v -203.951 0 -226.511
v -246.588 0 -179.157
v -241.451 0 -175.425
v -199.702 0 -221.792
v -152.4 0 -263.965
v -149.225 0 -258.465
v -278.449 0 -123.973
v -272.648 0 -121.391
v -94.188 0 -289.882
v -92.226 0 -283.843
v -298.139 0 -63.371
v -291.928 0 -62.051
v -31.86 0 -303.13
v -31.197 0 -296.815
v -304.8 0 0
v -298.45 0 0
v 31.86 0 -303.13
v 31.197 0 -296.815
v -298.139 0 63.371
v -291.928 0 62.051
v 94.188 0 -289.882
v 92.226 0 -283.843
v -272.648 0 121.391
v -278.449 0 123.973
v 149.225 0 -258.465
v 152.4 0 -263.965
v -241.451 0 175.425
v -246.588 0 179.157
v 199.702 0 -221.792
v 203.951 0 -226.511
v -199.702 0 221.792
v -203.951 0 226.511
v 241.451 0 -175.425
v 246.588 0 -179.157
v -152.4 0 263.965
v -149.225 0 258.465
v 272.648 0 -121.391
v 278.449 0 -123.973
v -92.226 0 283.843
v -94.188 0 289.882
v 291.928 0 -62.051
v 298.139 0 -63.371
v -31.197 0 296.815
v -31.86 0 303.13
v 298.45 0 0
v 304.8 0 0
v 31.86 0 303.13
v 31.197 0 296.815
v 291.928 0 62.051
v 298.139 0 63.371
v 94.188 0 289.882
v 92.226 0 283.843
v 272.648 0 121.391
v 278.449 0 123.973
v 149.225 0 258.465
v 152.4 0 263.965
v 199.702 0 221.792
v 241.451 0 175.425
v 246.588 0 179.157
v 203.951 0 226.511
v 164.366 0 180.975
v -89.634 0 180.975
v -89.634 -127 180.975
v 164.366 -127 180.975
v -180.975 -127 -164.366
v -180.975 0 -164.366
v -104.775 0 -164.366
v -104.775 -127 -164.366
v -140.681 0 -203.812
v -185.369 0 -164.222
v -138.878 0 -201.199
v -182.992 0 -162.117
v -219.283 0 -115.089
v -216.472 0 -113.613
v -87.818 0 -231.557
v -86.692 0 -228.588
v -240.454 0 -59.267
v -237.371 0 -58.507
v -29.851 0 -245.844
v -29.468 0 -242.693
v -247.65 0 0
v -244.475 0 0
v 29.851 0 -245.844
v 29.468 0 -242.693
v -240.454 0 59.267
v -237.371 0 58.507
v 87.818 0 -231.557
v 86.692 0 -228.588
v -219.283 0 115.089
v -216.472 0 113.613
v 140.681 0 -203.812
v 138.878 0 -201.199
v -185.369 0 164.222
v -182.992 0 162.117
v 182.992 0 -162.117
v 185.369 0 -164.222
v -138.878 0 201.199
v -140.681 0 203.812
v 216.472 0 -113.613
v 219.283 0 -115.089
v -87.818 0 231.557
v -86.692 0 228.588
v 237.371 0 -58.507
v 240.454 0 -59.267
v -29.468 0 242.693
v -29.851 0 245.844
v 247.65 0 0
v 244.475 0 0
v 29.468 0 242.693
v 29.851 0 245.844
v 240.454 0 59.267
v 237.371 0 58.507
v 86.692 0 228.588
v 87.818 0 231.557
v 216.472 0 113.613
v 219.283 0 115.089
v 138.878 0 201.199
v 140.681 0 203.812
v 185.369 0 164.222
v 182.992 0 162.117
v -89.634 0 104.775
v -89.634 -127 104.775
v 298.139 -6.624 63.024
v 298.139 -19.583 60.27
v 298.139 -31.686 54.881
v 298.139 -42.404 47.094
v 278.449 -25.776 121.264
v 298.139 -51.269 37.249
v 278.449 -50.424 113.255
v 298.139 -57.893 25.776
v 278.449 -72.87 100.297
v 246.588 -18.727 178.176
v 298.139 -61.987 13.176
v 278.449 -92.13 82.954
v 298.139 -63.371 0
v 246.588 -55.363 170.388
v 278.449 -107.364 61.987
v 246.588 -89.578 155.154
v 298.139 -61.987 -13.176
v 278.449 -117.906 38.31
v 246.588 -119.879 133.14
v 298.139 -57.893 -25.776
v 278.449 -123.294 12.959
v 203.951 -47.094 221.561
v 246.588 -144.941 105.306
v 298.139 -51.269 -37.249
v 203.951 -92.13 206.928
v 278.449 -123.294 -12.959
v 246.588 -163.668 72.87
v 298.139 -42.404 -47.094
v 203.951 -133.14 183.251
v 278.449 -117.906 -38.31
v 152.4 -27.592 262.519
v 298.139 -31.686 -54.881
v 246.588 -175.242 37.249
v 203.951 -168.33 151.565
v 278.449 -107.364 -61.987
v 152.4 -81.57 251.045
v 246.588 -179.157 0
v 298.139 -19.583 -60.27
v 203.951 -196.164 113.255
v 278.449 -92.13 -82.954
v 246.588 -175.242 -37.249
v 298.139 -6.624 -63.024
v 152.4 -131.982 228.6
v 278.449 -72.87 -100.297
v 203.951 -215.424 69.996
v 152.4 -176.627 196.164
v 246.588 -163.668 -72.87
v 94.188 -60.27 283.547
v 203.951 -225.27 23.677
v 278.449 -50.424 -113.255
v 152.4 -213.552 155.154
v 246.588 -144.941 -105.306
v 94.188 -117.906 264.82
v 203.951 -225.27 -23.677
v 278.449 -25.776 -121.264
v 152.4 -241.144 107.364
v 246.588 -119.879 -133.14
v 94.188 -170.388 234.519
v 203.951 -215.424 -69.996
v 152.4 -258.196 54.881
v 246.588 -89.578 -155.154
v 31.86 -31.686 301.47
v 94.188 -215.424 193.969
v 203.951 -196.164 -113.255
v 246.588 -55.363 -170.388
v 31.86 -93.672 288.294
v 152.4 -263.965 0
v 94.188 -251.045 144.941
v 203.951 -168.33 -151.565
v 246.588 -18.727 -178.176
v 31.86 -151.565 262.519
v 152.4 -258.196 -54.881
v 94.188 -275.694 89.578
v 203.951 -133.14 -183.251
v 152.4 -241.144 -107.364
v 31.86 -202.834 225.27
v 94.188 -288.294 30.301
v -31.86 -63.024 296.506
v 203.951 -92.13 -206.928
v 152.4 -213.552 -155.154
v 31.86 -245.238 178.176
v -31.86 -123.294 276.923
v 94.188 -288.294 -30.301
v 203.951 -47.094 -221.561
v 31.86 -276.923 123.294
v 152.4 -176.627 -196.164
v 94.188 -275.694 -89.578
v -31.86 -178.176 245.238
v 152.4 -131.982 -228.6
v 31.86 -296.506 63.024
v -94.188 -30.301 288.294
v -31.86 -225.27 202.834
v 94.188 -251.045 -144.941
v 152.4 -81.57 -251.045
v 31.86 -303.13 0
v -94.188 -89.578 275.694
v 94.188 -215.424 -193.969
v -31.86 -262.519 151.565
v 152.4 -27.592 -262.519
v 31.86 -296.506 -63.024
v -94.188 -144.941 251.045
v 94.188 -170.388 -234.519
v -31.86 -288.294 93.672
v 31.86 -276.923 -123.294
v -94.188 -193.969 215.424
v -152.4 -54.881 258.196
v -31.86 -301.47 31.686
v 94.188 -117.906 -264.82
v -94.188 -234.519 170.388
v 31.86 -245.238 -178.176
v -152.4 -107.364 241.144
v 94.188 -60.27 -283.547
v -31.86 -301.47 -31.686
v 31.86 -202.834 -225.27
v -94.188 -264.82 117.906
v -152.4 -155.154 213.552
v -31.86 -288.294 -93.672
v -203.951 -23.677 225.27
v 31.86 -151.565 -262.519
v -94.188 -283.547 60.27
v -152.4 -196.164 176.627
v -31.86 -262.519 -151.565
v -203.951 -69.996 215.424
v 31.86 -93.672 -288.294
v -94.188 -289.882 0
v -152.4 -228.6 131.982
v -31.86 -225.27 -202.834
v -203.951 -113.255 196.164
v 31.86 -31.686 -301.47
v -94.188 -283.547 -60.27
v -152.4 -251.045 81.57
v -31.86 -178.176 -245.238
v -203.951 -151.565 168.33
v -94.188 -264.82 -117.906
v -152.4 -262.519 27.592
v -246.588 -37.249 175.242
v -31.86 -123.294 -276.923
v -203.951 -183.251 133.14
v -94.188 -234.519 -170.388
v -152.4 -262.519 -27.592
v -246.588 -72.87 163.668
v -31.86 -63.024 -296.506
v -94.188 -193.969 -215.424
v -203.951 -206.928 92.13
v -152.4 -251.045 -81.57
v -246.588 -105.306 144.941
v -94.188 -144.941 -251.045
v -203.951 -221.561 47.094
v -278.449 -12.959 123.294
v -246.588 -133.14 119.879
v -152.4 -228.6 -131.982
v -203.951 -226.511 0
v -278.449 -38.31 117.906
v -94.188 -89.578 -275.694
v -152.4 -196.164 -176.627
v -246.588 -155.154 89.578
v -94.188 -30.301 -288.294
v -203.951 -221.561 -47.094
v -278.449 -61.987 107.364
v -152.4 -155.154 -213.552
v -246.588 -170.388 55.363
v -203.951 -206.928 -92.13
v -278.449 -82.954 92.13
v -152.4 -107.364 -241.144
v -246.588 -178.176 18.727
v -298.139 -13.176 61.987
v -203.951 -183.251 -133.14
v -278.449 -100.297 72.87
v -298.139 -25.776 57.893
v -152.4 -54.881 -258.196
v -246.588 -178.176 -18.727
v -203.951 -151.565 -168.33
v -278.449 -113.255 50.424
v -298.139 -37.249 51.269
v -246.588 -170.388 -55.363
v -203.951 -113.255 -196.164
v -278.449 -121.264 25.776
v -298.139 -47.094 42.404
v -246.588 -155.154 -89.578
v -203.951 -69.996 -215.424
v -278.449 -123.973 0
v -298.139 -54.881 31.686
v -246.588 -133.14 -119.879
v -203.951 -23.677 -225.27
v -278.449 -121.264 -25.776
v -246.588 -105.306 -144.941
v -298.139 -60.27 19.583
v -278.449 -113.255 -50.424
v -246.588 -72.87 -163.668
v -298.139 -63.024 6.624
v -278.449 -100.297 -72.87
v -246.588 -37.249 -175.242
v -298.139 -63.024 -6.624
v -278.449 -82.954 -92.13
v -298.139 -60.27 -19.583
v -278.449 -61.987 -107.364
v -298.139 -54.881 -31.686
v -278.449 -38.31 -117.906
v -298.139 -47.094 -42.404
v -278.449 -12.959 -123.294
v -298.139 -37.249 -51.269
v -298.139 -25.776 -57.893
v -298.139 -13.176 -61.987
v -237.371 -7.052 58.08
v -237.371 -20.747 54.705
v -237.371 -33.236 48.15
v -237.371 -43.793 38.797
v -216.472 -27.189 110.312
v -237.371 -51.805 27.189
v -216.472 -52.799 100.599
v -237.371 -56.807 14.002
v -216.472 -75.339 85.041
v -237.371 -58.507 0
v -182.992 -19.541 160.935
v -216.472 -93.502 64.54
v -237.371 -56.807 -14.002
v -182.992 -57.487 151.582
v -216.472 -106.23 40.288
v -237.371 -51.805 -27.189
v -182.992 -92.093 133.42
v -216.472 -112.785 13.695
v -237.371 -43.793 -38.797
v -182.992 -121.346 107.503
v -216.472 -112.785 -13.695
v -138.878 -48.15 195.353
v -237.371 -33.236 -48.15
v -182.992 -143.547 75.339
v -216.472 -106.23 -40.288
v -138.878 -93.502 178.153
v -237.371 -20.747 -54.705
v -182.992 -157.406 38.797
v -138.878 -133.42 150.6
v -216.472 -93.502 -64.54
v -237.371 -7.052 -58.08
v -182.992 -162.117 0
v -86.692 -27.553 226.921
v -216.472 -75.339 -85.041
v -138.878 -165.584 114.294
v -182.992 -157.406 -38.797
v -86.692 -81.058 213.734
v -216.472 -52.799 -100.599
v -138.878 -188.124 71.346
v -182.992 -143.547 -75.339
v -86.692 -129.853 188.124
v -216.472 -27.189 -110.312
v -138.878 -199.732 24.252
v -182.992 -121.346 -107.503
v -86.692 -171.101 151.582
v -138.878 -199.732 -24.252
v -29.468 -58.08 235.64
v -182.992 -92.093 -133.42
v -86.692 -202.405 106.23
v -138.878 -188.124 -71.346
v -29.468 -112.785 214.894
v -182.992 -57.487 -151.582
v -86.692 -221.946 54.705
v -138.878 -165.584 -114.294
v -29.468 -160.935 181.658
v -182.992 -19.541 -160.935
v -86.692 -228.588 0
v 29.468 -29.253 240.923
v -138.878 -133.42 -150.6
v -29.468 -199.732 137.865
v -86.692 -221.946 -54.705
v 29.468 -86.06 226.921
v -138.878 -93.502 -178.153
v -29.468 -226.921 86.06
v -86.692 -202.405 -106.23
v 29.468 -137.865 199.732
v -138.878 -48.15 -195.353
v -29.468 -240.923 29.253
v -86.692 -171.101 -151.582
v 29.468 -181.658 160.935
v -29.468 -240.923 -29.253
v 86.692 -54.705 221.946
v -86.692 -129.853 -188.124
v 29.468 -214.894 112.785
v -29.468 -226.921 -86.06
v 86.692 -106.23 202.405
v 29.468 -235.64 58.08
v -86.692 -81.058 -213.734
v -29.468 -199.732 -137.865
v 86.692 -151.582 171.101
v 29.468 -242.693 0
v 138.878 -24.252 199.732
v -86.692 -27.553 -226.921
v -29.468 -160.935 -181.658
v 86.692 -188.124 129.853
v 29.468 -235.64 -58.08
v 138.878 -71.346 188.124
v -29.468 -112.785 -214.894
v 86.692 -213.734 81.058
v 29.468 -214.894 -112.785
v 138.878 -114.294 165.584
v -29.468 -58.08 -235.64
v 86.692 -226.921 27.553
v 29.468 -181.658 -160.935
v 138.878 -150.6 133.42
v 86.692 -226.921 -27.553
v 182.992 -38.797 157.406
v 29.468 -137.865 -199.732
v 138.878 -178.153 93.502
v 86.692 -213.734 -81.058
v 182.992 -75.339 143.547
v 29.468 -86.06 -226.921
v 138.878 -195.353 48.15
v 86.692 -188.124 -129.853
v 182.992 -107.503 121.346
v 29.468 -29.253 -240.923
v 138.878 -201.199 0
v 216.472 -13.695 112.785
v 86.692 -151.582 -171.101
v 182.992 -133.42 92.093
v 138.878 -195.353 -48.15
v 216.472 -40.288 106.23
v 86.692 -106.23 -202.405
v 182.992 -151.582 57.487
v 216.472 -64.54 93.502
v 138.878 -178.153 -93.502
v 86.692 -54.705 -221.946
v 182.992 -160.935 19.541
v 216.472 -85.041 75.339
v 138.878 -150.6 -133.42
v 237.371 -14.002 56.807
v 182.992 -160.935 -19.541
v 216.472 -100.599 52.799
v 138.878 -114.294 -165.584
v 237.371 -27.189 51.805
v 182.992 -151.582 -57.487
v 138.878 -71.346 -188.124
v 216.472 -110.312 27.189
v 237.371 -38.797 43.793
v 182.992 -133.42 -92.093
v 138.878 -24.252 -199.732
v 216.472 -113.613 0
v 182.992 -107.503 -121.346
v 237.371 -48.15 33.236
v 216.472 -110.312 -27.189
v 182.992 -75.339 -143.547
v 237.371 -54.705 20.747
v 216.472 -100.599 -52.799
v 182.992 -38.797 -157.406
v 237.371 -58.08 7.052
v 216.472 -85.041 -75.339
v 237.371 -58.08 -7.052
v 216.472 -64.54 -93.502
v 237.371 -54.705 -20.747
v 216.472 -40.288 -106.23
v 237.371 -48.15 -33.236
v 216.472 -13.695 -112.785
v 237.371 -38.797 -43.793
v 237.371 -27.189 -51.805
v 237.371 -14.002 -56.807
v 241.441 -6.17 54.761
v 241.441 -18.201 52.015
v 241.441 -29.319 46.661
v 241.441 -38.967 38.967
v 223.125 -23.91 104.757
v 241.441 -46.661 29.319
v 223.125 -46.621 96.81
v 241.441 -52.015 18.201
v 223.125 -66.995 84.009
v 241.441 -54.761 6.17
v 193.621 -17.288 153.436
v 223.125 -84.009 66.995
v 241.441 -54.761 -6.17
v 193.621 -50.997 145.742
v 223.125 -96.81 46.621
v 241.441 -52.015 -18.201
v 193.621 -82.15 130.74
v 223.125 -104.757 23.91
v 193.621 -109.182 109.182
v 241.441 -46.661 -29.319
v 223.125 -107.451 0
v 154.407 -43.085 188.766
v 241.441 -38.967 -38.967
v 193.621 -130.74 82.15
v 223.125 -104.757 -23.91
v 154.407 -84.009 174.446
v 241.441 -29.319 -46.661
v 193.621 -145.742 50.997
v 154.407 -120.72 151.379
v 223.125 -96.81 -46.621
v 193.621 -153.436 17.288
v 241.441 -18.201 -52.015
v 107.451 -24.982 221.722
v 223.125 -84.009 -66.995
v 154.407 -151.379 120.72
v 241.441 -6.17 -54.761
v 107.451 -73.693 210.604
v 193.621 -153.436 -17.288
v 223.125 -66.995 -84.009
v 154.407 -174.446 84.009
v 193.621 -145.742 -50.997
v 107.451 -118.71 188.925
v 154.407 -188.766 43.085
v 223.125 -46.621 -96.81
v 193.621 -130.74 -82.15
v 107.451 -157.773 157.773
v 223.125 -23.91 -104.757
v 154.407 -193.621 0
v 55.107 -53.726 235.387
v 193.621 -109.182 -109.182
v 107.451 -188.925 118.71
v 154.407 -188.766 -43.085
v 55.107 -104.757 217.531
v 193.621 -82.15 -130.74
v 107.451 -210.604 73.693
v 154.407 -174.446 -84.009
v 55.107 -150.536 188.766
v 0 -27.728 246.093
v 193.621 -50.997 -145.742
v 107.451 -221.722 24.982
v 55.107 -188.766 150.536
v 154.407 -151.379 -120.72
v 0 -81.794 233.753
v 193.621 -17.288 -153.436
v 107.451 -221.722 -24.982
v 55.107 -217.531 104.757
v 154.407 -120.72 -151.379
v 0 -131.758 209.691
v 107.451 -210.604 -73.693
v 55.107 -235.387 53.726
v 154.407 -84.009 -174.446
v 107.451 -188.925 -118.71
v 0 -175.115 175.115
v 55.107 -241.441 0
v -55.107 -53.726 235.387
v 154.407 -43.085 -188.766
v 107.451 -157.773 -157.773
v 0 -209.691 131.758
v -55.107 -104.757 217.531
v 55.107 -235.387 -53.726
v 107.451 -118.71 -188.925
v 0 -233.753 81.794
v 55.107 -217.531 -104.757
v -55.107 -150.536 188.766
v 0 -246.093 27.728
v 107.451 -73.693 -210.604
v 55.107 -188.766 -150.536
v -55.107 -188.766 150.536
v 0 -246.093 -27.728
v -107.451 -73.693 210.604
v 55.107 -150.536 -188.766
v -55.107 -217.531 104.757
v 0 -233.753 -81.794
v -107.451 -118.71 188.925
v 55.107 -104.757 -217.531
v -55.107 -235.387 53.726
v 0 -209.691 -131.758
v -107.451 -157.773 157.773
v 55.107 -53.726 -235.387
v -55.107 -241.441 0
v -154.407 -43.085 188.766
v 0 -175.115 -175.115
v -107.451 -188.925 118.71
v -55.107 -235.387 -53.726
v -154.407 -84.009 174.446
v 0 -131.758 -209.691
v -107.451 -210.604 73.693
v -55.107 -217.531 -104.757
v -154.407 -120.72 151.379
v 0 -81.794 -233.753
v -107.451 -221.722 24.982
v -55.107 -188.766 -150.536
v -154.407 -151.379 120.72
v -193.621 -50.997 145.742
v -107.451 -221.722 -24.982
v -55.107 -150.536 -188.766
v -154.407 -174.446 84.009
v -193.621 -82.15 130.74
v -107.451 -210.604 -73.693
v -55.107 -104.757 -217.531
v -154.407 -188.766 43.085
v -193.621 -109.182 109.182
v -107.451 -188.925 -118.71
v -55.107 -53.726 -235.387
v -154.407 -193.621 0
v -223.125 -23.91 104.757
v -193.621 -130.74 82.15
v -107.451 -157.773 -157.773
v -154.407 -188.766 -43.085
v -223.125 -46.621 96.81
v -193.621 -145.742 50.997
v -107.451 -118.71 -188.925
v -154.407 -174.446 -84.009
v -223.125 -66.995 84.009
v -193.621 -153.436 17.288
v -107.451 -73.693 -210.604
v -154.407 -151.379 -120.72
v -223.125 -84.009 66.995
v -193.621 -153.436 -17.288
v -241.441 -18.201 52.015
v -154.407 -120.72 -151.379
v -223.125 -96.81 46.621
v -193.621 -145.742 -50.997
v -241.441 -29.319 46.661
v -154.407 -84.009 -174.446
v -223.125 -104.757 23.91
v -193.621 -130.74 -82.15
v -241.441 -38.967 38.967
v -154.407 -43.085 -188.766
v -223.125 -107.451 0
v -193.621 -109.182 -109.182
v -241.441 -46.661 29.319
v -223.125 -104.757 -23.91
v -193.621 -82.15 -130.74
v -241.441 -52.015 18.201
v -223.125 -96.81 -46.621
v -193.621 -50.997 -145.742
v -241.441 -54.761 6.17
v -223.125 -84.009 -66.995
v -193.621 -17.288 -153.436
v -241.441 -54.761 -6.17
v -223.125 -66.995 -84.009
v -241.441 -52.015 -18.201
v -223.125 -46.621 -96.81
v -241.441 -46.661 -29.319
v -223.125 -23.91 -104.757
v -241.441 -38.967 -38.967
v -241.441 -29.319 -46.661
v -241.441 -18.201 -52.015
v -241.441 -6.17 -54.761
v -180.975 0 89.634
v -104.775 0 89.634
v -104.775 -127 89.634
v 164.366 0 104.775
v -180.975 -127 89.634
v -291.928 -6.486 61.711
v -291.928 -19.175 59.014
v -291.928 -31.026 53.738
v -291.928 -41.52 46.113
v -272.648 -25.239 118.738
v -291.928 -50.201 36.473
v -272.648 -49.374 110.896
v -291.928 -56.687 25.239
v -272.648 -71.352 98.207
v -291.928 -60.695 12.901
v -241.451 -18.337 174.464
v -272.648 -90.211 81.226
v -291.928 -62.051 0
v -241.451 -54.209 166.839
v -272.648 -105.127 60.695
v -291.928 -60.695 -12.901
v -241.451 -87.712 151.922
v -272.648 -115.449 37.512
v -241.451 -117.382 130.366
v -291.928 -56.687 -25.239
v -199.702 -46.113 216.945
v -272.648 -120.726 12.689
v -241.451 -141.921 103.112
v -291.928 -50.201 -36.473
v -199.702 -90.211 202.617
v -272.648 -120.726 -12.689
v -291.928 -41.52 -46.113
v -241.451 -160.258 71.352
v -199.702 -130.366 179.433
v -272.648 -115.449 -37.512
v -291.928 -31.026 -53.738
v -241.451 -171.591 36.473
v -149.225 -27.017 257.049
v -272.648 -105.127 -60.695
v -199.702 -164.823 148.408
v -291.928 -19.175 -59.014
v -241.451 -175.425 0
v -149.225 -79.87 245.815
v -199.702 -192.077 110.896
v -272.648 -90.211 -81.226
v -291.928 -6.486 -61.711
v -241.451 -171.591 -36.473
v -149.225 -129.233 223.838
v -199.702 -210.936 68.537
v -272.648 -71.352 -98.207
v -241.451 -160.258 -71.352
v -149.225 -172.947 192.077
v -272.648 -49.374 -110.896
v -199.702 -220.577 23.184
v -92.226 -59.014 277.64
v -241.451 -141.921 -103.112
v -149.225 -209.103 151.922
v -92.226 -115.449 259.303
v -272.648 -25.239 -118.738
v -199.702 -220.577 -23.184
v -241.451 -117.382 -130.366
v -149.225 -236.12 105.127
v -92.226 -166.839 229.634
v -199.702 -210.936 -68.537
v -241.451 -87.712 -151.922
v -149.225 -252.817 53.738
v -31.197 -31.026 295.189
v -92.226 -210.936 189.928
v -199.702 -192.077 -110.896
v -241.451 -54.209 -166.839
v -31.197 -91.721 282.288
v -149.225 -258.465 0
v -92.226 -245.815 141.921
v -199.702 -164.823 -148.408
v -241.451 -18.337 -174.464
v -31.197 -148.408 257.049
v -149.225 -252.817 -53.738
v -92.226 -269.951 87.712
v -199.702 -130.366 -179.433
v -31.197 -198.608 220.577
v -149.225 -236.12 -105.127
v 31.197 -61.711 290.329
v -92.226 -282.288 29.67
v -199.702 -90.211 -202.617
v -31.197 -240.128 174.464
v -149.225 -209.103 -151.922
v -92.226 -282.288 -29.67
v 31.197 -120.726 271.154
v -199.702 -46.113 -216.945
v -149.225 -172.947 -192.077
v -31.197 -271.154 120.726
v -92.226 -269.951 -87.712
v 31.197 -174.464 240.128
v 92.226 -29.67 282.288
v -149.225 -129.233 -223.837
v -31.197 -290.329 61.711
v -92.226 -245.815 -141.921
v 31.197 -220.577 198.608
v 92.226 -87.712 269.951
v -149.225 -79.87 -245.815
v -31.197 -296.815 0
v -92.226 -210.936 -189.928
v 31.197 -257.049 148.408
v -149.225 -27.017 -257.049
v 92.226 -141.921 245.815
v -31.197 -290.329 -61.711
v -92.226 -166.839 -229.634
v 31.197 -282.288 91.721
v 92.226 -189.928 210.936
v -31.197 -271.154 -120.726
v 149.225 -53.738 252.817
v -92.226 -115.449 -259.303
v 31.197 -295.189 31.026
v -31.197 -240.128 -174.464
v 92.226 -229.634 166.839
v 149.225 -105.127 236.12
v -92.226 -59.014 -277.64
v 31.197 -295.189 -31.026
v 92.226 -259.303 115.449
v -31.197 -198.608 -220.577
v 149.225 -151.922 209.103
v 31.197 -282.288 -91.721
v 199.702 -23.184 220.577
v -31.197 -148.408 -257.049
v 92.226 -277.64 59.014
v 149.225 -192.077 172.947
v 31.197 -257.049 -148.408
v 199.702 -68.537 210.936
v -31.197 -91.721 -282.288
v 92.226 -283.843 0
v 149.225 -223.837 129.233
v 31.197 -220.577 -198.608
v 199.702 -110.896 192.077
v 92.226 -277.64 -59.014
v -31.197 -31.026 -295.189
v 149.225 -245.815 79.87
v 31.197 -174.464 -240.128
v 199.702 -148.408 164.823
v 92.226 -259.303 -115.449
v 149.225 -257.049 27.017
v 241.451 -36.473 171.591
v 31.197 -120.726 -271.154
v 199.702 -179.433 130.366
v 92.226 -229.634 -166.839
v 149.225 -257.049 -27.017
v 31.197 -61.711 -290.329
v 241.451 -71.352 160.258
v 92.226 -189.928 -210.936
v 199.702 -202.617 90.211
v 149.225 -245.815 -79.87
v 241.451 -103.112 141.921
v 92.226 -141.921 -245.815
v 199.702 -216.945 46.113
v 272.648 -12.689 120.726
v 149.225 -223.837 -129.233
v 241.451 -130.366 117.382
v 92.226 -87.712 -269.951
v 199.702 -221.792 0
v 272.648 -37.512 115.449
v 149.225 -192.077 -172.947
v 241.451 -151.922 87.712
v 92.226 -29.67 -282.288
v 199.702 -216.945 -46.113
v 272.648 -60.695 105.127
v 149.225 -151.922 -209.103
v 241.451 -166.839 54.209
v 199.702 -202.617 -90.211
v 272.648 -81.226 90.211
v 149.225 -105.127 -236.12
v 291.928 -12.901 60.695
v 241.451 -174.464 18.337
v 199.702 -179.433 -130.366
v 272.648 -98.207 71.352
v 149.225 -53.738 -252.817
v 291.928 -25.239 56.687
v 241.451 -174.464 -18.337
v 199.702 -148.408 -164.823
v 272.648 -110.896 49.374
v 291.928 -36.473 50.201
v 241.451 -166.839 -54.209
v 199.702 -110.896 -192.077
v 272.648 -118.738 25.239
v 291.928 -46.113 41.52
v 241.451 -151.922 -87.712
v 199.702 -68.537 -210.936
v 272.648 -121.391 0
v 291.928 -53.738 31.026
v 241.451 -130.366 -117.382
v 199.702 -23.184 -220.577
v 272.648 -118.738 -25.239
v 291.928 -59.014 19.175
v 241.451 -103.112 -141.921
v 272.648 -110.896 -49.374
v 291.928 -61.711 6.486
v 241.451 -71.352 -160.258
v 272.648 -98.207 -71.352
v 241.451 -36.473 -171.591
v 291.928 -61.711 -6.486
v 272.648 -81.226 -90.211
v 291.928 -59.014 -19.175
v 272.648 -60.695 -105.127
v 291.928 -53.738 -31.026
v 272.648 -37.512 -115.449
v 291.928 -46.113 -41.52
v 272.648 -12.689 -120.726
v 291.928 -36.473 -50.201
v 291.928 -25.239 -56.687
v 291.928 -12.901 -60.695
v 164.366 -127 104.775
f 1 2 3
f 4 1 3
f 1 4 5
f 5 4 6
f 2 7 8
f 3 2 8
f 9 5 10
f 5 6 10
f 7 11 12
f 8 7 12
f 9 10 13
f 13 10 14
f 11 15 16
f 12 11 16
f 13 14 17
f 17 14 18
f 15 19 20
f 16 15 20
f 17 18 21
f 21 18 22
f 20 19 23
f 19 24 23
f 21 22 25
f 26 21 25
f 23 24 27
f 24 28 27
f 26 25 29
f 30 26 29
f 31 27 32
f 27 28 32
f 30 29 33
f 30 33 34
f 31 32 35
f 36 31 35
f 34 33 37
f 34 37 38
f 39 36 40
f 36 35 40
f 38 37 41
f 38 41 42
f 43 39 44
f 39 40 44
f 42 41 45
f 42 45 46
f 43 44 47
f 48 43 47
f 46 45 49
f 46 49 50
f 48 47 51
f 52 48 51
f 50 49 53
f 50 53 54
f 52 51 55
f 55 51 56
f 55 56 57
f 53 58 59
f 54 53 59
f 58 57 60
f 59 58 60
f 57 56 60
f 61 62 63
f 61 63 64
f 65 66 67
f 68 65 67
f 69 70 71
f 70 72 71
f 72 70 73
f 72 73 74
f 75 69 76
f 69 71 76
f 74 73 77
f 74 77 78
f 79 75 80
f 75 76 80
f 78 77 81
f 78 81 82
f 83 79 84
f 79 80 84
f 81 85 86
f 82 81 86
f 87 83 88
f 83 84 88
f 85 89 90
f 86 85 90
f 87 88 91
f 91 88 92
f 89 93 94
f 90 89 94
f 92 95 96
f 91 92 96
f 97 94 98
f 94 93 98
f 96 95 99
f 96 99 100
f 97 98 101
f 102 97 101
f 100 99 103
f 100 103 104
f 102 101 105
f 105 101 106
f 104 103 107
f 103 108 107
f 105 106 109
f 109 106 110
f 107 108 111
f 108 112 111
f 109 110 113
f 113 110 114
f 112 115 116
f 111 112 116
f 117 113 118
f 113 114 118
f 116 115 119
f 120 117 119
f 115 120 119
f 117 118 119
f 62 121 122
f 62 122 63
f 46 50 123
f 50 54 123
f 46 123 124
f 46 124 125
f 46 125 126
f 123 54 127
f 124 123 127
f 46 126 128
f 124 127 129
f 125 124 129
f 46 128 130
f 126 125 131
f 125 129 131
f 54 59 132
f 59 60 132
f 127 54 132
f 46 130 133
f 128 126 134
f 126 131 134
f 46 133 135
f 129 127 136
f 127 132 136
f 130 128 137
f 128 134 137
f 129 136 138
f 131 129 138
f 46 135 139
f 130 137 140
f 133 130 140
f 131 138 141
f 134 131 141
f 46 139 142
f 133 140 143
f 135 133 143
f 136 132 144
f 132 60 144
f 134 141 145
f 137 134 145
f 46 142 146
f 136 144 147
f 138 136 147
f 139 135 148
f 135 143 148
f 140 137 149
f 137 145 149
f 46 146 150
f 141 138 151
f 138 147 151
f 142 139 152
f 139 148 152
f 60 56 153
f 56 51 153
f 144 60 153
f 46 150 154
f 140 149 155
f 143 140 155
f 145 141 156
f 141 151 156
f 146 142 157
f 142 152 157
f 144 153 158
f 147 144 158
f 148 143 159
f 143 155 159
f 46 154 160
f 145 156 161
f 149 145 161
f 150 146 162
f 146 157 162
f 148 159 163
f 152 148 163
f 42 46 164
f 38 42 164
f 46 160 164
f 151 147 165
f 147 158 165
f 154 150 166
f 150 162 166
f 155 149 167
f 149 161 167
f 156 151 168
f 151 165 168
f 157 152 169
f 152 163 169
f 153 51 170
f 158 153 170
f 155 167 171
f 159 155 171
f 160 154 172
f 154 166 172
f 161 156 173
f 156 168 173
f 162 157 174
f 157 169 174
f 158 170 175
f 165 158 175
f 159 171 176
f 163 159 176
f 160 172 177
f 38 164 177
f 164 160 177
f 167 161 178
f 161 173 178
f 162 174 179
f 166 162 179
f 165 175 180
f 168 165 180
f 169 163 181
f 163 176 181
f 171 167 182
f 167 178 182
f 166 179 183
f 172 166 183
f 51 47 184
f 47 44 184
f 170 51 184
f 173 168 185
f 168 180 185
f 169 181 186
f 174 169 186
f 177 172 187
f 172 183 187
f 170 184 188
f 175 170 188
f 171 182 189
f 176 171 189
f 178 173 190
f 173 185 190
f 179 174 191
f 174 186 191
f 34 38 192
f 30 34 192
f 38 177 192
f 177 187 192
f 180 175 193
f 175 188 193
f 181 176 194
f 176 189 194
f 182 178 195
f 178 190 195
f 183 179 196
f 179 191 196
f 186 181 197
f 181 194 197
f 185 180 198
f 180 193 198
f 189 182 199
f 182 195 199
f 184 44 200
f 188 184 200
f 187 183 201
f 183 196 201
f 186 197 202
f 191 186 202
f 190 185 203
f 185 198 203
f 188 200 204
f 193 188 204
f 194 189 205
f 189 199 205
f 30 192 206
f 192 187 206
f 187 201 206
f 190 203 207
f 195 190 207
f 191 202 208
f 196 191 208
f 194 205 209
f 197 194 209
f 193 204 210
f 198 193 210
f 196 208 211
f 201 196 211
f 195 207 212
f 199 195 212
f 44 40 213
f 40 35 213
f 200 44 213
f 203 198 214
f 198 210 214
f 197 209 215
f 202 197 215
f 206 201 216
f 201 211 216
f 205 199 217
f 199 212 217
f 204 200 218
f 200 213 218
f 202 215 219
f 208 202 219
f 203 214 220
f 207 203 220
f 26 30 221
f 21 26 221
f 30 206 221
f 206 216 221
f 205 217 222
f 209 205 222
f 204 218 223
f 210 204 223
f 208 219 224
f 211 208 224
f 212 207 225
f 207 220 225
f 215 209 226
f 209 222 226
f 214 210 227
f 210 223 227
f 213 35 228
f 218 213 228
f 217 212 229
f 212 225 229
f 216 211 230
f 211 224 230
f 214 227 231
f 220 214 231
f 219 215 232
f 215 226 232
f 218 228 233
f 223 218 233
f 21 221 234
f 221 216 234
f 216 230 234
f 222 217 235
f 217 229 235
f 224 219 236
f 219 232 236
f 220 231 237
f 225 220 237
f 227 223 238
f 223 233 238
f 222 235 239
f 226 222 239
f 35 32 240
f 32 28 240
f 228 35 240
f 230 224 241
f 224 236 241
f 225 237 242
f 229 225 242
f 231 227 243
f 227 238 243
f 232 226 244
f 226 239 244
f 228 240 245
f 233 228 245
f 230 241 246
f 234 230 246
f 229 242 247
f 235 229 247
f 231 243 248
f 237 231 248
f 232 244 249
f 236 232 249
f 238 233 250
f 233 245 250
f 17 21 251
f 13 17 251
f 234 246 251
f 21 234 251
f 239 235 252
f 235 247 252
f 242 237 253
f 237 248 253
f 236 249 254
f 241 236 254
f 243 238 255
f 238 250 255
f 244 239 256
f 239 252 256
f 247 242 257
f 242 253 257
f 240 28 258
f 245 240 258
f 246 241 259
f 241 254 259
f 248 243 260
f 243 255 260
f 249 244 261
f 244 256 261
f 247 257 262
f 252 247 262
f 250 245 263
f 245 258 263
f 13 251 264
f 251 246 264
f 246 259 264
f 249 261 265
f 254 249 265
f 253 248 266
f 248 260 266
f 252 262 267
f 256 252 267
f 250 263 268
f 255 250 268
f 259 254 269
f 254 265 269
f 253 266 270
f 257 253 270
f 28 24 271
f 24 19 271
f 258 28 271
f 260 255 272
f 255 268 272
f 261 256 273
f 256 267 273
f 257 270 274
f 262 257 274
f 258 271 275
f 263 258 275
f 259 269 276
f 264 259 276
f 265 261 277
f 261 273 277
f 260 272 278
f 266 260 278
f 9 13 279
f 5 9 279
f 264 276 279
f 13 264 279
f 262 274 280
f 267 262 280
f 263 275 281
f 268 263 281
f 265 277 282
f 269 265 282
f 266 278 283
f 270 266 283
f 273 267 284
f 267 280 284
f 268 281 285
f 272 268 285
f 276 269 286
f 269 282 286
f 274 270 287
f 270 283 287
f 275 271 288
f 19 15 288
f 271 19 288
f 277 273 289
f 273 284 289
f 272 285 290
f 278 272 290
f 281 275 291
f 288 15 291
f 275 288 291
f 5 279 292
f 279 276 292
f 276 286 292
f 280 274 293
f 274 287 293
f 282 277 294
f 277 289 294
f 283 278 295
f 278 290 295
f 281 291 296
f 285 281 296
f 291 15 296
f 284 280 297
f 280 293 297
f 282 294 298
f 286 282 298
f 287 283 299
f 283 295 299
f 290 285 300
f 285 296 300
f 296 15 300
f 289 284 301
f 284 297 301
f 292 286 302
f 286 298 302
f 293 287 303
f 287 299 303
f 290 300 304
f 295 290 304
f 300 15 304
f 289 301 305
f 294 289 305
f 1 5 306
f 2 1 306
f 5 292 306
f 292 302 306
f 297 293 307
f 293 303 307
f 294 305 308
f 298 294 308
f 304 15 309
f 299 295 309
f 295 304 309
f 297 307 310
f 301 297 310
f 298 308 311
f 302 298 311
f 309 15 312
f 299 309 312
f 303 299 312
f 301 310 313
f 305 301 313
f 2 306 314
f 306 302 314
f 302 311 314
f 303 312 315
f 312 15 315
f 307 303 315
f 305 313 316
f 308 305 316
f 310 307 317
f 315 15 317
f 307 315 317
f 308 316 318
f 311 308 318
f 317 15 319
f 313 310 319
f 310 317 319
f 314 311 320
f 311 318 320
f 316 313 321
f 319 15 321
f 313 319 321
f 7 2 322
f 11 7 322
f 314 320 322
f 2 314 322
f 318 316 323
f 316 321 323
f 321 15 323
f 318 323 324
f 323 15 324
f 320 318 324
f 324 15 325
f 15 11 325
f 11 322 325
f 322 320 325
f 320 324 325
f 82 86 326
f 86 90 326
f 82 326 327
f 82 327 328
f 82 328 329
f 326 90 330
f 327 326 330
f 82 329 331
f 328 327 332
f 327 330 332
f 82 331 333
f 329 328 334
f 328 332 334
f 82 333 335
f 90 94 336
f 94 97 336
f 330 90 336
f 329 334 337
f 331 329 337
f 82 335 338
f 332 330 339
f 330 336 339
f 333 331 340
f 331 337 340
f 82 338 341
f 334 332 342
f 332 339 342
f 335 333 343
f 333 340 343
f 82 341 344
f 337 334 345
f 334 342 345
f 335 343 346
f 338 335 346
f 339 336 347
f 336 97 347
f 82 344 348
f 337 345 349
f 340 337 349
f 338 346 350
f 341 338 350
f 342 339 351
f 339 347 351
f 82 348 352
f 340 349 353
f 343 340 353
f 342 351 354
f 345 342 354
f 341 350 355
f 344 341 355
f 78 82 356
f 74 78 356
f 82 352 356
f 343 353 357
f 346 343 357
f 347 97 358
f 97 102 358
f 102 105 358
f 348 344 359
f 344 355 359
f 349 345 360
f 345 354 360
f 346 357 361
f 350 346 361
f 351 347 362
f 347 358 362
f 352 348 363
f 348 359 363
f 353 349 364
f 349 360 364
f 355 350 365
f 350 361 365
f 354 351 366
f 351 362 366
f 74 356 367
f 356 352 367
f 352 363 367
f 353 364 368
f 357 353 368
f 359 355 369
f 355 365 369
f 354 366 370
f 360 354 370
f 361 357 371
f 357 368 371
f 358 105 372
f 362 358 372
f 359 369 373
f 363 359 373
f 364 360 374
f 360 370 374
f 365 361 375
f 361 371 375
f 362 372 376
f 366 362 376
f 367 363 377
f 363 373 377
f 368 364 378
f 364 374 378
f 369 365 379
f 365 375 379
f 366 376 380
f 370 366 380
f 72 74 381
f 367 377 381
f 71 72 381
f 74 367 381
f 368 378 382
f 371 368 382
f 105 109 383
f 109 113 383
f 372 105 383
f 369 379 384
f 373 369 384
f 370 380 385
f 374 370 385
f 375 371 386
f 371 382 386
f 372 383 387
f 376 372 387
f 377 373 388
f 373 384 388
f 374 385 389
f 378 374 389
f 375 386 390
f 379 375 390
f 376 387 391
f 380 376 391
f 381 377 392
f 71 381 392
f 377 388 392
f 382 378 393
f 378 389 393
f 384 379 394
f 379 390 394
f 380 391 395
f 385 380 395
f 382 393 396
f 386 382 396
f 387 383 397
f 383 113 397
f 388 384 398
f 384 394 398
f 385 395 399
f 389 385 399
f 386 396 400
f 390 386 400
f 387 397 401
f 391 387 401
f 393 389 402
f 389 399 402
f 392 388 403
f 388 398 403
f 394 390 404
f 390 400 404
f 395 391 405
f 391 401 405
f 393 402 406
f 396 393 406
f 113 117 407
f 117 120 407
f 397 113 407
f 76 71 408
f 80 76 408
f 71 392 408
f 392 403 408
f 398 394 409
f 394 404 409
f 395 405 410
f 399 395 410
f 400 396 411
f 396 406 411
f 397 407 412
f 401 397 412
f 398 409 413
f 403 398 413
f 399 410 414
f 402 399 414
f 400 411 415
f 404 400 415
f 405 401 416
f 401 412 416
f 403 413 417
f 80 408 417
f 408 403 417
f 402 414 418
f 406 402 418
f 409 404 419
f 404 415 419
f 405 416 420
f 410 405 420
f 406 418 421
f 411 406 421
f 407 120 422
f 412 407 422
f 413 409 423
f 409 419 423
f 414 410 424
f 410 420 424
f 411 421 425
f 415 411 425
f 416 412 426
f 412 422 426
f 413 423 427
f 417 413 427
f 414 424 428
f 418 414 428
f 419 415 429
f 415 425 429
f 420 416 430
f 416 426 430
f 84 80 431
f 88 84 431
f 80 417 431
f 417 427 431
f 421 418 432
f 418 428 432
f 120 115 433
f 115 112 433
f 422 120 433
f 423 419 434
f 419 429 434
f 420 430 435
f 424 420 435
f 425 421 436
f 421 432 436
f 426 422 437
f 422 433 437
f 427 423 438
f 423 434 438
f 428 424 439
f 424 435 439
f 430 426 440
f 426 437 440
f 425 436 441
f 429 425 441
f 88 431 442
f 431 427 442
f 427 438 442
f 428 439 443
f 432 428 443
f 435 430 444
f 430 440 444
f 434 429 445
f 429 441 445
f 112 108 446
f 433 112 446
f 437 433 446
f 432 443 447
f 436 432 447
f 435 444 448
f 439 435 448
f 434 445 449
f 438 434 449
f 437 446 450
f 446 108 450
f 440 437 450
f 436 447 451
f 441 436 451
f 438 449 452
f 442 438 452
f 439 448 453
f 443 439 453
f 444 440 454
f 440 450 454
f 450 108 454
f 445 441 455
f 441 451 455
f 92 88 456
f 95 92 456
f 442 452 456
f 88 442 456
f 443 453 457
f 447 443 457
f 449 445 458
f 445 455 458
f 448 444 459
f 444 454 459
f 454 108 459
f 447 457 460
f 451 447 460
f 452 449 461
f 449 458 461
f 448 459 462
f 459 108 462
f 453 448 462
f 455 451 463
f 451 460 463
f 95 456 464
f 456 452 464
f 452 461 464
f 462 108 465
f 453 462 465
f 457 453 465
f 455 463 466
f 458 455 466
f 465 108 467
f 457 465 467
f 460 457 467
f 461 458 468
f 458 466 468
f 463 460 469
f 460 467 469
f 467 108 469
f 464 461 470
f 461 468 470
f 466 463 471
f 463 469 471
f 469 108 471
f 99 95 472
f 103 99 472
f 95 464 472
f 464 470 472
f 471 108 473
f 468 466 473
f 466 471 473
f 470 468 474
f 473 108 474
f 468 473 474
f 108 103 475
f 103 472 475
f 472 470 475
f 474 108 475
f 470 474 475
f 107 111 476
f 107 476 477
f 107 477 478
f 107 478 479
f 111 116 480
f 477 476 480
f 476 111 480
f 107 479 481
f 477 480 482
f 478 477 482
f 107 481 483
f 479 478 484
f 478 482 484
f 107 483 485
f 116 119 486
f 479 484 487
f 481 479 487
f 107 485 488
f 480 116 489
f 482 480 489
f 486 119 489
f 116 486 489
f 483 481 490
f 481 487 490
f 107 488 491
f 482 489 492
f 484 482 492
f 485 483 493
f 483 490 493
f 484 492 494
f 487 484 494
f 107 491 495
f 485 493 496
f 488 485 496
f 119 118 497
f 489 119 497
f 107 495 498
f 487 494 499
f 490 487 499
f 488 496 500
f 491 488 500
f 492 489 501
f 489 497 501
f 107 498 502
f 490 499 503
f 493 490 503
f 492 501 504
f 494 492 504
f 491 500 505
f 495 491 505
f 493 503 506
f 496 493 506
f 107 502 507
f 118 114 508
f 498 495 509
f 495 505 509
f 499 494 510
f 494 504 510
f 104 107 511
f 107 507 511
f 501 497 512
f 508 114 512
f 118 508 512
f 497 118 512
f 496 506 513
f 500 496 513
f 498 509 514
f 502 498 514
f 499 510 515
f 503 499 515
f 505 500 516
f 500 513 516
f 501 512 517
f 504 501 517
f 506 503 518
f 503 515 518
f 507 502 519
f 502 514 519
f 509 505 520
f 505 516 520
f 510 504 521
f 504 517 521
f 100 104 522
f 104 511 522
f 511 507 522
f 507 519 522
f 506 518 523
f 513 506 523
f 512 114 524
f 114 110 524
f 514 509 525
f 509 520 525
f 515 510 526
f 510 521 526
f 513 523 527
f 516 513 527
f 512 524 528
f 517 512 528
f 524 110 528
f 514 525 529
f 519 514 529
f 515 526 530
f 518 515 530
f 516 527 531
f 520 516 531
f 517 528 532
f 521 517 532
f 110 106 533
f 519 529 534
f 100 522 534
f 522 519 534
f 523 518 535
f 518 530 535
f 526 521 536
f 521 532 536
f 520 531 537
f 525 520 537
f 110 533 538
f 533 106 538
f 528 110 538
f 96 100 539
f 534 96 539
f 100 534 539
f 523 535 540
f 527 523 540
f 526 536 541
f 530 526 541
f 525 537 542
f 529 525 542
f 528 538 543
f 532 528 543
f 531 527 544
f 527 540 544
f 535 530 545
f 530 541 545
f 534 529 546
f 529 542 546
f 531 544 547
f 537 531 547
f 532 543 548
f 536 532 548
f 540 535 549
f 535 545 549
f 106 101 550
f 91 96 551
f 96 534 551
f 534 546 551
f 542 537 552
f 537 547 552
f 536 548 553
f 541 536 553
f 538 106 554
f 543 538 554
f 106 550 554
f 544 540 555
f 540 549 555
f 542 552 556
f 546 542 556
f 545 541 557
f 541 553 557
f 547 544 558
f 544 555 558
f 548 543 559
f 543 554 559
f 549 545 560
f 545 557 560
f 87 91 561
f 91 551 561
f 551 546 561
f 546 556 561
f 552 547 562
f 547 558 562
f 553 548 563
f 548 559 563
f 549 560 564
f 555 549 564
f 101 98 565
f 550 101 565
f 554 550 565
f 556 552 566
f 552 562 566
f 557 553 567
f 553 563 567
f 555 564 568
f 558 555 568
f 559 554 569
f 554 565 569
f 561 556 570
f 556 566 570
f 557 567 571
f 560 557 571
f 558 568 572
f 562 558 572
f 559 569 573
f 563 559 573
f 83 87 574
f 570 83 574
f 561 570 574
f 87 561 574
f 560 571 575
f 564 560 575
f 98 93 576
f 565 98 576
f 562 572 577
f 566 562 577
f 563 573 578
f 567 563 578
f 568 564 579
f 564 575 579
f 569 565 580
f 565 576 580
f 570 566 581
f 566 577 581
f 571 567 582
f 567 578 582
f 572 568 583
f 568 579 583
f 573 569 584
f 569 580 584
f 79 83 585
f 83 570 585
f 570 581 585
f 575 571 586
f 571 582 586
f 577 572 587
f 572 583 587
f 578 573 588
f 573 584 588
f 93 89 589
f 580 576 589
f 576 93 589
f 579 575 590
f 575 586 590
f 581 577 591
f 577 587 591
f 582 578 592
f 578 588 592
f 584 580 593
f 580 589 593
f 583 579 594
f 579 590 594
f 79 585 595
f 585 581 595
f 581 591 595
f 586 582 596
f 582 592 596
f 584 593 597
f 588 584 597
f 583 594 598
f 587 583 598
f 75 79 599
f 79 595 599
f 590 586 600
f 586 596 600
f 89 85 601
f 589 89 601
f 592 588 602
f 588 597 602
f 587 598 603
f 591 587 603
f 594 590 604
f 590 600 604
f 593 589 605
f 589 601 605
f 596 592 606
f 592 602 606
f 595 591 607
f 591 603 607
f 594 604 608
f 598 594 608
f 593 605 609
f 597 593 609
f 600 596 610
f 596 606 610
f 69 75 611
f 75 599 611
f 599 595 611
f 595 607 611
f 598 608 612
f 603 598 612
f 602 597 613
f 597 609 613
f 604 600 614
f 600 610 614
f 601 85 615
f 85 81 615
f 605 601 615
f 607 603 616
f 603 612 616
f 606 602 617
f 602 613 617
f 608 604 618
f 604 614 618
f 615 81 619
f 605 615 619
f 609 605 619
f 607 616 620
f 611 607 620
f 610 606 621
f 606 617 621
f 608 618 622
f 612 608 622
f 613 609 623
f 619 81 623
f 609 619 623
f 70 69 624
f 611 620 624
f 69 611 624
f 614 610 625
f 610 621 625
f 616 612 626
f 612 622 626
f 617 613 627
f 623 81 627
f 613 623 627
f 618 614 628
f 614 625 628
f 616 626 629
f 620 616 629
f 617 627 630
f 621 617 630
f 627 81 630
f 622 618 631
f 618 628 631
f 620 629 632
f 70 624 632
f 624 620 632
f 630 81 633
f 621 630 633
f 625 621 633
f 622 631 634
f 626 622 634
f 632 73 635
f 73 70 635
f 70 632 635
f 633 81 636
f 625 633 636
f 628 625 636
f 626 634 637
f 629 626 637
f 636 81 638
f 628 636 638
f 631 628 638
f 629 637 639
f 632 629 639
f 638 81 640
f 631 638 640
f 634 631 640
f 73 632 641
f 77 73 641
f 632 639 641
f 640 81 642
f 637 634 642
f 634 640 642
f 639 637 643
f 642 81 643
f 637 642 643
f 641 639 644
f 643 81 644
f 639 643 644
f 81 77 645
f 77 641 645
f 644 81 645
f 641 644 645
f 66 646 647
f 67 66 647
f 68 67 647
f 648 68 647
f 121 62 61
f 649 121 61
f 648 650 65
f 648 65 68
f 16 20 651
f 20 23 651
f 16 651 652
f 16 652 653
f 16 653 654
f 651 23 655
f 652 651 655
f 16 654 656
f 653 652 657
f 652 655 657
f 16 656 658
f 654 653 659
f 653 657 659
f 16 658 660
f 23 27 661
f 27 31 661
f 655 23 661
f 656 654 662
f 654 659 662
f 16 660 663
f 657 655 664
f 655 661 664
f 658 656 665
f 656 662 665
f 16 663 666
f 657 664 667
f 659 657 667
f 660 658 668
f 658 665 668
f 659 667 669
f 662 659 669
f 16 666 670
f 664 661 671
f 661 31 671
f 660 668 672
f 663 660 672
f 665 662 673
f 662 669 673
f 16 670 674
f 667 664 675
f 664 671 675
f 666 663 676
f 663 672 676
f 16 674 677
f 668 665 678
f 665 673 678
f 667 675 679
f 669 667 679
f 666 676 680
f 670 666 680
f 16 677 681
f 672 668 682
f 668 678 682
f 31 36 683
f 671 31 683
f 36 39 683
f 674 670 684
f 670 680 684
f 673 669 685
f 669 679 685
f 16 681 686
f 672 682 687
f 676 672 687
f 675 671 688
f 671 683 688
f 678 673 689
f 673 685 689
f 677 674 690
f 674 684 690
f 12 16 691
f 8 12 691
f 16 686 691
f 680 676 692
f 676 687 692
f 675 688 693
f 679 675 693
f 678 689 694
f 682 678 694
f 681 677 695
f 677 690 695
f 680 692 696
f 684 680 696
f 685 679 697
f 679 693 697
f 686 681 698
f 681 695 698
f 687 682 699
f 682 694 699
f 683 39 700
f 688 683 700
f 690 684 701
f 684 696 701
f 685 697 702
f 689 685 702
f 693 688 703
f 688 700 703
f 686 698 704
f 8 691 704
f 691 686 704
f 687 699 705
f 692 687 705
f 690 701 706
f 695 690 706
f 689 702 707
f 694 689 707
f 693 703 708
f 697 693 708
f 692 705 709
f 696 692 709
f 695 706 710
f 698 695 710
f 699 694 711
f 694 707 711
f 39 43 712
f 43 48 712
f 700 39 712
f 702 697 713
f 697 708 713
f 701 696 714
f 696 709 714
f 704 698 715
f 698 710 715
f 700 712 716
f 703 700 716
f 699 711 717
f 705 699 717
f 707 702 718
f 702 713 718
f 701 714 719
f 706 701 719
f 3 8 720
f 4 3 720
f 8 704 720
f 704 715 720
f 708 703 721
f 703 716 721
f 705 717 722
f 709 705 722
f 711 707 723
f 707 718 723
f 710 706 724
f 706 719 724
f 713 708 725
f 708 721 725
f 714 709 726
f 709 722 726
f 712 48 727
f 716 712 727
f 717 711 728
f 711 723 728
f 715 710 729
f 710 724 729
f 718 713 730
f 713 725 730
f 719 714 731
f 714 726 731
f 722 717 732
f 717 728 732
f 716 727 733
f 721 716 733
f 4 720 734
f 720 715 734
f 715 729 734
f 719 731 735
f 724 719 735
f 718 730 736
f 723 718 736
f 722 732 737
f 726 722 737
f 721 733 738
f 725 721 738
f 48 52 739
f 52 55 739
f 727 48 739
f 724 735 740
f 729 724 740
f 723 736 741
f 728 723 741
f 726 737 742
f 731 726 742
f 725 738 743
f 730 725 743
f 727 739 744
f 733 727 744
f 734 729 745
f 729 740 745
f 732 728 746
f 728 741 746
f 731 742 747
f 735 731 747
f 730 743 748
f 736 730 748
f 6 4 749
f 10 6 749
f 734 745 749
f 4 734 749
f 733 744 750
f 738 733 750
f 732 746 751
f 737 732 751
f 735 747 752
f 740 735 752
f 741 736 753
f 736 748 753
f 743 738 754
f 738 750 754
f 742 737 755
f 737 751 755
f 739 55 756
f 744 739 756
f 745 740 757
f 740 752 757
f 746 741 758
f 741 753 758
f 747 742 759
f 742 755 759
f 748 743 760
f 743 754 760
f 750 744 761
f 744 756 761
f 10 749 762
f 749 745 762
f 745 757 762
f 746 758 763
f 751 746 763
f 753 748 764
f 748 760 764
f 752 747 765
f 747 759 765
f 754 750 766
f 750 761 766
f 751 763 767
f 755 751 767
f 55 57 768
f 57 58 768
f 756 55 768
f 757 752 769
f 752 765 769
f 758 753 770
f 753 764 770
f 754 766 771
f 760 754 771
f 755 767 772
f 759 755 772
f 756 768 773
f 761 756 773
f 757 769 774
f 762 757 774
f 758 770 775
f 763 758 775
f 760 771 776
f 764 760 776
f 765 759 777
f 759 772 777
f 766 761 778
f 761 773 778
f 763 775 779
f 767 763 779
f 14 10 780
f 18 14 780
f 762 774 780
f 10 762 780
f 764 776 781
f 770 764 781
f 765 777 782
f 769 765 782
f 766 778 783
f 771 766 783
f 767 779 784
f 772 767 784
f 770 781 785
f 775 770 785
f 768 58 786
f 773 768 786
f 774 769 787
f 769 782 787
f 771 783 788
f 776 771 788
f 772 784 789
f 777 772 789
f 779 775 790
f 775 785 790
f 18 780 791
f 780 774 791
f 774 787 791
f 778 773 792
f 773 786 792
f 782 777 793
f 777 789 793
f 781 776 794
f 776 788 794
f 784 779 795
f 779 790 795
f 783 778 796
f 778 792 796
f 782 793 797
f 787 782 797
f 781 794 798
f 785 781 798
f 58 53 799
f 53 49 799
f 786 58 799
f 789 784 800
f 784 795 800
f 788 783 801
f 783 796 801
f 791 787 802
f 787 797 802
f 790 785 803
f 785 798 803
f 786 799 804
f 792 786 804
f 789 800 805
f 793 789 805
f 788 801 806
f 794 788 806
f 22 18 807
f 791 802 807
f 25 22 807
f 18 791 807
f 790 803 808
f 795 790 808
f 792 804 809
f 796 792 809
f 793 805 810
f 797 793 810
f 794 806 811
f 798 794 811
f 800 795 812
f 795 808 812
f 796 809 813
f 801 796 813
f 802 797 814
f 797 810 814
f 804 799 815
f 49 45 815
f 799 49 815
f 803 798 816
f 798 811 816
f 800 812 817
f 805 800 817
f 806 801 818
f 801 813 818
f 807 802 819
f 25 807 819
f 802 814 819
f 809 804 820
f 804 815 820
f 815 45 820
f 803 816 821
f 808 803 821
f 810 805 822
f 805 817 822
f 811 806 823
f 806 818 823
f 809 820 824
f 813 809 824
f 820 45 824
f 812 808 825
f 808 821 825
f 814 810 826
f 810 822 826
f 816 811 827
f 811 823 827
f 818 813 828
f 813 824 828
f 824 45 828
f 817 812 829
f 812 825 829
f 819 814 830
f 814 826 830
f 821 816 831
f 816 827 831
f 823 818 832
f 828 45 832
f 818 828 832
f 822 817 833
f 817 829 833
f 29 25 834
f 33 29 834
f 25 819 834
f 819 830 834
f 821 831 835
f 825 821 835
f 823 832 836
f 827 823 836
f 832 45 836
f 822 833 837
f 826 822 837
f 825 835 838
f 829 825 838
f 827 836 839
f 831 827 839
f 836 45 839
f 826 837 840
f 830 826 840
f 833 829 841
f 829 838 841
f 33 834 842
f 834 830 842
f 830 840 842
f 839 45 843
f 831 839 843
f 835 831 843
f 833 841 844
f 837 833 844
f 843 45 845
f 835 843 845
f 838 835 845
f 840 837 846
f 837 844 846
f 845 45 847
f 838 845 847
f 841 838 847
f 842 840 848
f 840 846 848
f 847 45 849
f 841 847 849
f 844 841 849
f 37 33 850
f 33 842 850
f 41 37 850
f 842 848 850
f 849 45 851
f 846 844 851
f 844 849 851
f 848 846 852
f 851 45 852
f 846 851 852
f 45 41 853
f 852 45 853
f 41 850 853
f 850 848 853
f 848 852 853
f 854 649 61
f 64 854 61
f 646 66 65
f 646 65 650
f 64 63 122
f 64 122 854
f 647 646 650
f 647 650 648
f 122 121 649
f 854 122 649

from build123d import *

# Parameters (mm, degrees)
F1_ANGLE = 180
F3_ANGLE = -180
F4_W     = 76.2
F4_H     = 254
F4_W_2   = 254
F4_H_2   = 76.2
F5_DEPTH = 127


with BuildPart() as f1:
    # F0 (on Front) → F1 (revolve)
    with BuildSketch(Plane.XZ):
        with BuildLine():
            Line((298.45, 0), (304.8, 0))
            ThreePointArc((304.8, 0), (0, 304.8), (-304.8, 0))
            Line((-304.8, 0), (-298.45, 0))
            ThreePointArc((-298.45, 0), (0, 298.45), (298.45, 0))
        make_face()
    revolve(axis=Axis((0, 0, 0), (1, 0, 0)), revolution_arc=F1_ANGLE)


with BuildPart() as f3:
    # F2 (on Front) → F3 (revolve)
    with BuildSketch(Plane.XZ):
        with BuildLine():
            Line((244.475, 0), (247.65, 0))
            ThreePointArc((247.65, 0), (0, 247.65), (-247.65, 0))
            Line((-247.65, 0), (-244.475, 0))
            ThreePointArc((-244.475, 0), (0, 244.475), (244.475, 0))
        make_face()
    revolve(axis=Axis((0, 0, 0), (-1, 0, 0)), revolution_arc=F3_ANGLE)


with BuildPart() as f5:
    # F4 (on Front) → F5 (new body)
    with BuildSketch(Plane.XZ):
        with Locations((-142.875, -37.365675)):
            Rectangle(F4_W, F4_H)
        with Locations((37.365675, 142.875)):
            Rectangle(F4_W_2, F4_H_2)
    extrude(amount=F5_DEPTH)


solid = Compound([f1.part, f3.part, f5.part])
